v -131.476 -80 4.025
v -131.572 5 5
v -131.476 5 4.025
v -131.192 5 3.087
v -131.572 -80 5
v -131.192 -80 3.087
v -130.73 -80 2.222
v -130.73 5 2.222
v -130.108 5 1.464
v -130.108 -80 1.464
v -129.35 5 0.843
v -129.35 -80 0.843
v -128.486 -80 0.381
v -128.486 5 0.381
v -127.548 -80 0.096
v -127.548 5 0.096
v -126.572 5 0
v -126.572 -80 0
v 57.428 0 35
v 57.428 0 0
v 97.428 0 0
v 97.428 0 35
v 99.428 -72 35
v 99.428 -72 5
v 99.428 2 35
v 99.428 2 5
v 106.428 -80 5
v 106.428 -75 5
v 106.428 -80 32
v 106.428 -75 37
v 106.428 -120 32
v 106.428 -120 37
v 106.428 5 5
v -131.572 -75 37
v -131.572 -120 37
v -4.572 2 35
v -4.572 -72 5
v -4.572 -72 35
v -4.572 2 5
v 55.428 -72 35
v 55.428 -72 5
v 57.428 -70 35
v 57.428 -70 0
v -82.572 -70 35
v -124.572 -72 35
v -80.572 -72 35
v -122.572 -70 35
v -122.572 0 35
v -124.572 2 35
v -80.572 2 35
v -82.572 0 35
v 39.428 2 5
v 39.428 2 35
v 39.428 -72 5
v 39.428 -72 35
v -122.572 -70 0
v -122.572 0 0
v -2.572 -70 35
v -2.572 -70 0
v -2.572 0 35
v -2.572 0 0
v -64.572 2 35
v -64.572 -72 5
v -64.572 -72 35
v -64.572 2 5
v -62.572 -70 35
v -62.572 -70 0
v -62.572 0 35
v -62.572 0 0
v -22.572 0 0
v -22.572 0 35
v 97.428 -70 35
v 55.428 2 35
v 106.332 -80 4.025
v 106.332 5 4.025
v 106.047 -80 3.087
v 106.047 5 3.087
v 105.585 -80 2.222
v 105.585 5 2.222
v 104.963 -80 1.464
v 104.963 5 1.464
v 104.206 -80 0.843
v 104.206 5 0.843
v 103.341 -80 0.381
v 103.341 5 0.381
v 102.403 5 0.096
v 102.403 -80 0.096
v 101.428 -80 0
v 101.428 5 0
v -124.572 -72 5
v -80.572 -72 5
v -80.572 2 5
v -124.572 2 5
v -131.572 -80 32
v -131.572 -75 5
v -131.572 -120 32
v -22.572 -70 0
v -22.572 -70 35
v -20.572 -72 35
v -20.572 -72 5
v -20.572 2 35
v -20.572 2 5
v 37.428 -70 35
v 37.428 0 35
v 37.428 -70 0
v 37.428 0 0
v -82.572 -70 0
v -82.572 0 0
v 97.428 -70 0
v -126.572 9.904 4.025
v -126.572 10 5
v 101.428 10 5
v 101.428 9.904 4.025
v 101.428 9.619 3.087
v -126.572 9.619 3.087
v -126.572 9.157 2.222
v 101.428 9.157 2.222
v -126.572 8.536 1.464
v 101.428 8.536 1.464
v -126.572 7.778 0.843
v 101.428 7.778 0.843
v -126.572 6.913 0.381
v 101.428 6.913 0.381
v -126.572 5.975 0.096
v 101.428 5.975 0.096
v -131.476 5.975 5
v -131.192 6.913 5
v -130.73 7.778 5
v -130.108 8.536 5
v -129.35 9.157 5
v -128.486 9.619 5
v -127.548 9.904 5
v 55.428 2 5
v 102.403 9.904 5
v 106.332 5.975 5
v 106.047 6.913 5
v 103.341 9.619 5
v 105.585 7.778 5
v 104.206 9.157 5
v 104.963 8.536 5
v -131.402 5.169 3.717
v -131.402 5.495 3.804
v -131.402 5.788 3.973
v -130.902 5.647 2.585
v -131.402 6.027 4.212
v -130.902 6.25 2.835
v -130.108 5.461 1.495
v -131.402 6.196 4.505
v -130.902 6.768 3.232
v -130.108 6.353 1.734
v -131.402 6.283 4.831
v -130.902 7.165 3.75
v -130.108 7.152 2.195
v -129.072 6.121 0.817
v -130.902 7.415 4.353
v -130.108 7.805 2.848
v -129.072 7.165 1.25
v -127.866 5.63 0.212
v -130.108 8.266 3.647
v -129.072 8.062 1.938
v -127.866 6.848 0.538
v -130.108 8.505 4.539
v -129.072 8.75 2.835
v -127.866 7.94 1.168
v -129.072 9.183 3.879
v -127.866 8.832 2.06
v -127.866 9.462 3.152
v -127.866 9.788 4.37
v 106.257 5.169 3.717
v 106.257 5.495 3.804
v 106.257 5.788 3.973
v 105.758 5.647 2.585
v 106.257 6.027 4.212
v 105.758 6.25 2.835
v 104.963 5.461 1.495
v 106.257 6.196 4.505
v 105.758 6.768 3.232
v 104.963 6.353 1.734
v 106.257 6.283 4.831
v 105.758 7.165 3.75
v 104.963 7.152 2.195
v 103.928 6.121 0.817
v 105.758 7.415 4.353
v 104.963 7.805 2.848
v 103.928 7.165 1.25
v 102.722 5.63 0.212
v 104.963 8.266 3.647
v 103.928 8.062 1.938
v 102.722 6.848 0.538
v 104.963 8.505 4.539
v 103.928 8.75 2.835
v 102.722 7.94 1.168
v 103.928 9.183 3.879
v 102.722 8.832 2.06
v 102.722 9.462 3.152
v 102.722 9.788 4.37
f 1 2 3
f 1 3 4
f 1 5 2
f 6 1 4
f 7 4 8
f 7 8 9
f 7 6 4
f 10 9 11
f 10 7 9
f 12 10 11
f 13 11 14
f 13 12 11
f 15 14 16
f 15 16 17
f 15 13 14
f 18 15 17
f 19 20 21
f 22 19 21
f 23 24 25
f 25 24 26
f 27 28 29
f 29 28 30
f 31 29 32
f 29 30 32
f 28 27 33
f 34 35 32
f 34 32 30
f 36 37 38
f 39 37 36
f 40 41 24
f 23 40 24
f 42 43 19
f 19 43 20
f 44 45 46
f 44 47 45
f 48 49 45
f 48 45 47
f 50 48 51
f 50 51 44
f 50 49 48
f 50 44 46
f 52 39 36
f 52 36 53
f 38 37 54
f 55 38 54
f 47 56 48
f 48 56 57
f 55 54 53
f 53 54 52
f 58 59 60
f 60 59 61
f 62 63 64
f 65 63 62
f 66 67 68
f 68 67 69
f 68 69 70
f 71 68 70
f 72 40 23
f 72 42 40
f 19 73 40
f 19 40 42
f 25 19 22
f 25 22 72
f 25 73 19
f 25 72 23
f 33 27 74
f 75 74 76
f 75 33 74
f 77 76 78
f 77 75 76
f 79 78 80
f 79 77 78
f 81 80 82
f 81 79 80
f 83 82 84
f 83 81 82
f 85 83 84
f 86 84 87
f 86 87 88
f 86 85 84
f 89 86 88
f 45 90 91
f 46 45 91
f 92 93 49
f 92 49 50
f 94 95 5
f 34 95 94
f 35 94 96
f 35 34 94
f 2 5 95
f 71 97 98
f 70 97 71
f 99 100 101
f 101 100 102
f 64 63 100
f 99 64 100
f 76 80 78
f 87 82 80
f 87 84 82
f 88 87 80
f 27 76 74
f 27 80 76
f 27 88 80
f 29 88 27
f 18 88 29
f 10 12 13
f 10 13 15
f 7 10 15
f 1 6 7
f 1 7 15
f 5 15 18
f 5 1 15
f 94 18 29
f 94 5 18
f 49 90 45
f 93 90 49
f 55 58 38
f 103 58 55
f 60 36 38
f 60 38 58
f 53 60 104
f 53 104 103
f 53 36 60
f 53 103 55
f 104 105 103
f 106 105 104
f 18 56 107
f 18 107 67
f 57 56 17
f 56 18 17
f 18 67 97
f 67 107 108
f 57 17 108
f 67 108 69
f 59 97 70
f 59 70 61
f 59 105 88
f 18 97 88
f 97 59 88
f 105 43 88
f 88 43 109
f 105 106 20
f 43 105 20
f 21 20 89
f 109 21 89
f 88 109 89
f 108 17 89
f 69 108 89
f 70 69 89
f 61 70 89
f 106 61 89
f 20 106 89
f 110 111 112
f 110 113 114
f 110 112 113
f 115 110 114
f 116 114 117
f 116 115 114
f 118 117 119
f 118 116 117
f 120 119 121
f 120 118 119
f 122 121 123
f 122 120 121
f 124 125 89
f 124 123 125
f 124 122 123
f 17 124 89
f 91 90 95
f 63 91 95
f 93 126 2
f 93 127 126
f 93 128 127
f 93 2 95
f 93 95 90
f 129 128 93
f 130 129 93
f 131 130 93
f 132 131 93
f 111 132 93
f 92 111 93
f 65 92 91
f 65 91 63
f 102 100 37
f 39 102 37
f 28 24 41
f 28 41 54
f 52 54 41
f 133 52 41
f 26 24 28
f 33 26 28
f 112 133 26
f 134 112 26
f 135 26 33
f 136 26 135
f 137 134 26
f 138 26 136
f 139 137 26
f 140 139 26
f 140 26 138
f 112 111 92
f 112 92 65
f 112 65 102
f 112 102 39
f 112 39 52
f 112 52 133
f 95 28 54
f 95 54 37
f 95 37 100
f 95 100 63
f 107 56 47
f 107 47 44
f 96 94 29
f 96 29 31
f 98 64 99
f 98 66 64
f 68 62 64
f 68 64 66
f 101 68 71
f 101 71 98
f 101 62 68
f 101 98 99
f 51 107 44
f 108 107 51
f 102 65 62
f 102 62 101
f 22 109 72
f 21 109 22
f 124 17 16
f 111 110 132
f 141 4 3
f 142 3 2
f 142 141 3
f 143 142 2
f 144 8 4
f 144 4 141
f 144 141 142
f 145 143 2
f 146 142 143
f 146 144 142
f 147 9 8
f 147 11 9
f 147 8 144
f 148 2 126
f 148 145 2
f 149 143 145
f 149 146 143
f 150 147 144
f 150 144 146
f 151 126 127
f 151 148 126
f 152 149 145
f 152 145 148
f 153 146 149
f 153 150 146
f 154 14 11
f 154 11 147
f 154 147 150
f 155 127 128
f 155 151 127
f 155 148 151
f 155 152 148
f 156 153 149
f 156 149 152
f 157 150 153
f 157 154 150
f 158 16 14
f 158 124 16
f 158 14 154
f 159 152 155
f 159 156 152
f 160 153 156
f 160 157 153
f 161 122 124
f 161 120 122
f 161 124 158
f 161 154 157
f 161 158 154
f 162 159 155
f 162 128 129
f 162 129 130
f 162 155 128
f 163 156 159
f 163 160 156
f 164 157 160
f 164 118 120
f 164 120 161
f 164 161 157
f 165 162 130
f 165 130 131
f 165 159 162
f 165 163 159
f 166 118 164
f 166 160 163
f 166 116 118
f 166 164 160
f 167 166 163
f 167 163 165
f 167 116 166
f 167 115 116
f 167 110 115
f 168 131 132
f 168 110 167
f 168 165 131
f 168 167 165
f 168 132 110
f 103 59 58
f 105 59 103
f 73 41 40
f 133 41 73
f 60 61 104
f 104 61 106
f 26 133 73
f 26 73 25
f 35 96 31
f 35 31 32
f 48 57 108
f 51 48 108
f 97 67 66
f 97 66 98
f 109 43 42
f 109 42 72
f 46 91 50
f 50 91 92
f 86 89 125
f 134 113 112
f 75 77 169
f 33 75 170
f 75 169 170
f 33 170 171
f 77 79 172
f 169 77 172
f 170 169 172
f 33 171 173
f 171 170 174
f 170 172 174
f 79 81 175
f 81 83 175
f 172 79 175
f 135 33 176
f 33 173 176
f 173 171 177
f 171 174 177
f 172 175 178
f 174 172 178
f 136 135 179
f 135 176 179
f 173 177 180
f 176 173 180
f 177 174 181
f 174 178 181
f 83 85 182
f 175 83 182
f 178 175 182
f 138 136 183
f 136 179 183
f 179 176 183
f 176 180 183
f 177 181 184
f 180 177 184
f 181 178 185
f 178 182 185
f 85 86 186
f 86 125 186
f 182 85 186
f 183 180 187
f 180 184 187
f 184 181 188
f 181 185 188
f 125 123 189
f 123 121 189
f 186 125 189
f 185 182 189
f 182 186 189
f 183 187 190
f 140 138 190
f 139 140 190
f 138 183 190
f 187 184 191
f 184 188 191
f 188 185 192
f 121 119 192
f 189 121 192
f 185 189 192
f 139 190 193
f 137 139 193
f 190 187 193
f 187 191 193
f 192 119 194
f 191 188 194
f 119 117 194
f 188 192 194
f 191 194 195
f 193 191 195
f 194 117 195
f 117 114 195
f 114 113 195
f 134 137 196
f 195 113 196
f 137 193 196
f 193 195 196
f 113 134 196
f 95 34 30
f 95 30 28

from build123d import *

# Parameters (mm, degrees)
F0_W     = 44
F0_H     = 74
F1_DEPTH = 5
F2_W     = 5
F2_H     = 27
F3_DEPTH = 238
F0_W_2   = 40
F0_H_2   = 70
F4_DEPTH = 35
F5_R     = 4.99999


# Not quite as in the source:
# - a fillet or chamfer is up to 0.001 mm smaller than in the source, because OpenCascade refuses the exact size


with BuildPart() as f1:
    # F0 (on Top) → F1 (new body)
    with BuildSketch(Plane.XY):
        Polygon((106.4276799491, 10), (-131.5723200509, 10), (-131.5723200509, -80), (-129.5723200509, -80), (106.4276799491, -80), align=None)
        with Locations((-102.5723200509, -35)):
            Rectangle(F0_W, F0_H, mode=Mode.SUBTRACT)
        with Locations((-42.5723200509, -35)):
            Rectangle(F0_W, F0_H, mode=Mode.SUBTRACT)
        with Locations((17.4276799491, -35)):
            Rectangle(F0_W, F0_H, mode=Mode.SUBTRACT)
        with Locations((77.4276799491, -35)):
            Rectangle(F0_W, F0_H, mode=Mode.SUBTRACT)
    extrude(amount=F1_DEPTH)

    # F2 (on face) → F3 (join)
    with BuildSketch(Plane(origin=(-131.5723200509, 0, 0), x_dir=(0, -1, 0), z_dir=(-1, 0, 0))):
        Polygon((120, 32), (120, 37), (75, 37), (75, 32), (80, 32), align=None)
        with Locations((77.5, 18.5)):
            Rectangle(F2_W, F2_H)
    extrude(amount=-F3_DEPTH)

    # F0 (on Top) → F4 (join)
    with BuildSketch(Plane.XY):
        with Locations((-102.5723200509, -35)):
            Rectangle(F0_W, F0_H)
        with Locations((-102.5723200509, -35)):
            Rectangle(F0_W_2, F0_H_2, mode=Mode.SUBTRACT)
        with Locations((-42.5723200509, -35)):
            Rectangle(F0_W, F0_H)
        with Locations((-42.5723200509, -35)):
            Rectangle(F0_W_2, F0_H_2, mode=Mode.SUBTRACT)
        with Locations((17.4276799491, -35)):
            Rectangle(F0_W, F0_H)
        with Locations((17.4276799491, -35)):
            Rectangle(F0_W_2, F0_H_2, mode=Mode.SUBTRACT)
        with Locations((77.4276799491, -35)):
            Rectangle(F0_W, F0_H)
        with Locations((77.4276799491, -35)):
            Rectangle(F0_W_2, F0_H_2, mode=Mode.SUBTRACT)
    extrude(amount=F4_DEPTH)

    # F5 (radius 5 in the source; OpenCascade refuses exactly that, so slightly less here)
    f5_edges = [f1.edges().sort_by_distance(p)[0] for p in [
        (-12.57232, 10, 0),
        (-131.57232, -35, 0),
        (106.42768, -35, 0),
        (106.42768, 10, 2.5),
        (-131.57232, 10, 2.5),
    ]]
    fillet(f5_edges, radius=F5_R)


solid = f1.part
